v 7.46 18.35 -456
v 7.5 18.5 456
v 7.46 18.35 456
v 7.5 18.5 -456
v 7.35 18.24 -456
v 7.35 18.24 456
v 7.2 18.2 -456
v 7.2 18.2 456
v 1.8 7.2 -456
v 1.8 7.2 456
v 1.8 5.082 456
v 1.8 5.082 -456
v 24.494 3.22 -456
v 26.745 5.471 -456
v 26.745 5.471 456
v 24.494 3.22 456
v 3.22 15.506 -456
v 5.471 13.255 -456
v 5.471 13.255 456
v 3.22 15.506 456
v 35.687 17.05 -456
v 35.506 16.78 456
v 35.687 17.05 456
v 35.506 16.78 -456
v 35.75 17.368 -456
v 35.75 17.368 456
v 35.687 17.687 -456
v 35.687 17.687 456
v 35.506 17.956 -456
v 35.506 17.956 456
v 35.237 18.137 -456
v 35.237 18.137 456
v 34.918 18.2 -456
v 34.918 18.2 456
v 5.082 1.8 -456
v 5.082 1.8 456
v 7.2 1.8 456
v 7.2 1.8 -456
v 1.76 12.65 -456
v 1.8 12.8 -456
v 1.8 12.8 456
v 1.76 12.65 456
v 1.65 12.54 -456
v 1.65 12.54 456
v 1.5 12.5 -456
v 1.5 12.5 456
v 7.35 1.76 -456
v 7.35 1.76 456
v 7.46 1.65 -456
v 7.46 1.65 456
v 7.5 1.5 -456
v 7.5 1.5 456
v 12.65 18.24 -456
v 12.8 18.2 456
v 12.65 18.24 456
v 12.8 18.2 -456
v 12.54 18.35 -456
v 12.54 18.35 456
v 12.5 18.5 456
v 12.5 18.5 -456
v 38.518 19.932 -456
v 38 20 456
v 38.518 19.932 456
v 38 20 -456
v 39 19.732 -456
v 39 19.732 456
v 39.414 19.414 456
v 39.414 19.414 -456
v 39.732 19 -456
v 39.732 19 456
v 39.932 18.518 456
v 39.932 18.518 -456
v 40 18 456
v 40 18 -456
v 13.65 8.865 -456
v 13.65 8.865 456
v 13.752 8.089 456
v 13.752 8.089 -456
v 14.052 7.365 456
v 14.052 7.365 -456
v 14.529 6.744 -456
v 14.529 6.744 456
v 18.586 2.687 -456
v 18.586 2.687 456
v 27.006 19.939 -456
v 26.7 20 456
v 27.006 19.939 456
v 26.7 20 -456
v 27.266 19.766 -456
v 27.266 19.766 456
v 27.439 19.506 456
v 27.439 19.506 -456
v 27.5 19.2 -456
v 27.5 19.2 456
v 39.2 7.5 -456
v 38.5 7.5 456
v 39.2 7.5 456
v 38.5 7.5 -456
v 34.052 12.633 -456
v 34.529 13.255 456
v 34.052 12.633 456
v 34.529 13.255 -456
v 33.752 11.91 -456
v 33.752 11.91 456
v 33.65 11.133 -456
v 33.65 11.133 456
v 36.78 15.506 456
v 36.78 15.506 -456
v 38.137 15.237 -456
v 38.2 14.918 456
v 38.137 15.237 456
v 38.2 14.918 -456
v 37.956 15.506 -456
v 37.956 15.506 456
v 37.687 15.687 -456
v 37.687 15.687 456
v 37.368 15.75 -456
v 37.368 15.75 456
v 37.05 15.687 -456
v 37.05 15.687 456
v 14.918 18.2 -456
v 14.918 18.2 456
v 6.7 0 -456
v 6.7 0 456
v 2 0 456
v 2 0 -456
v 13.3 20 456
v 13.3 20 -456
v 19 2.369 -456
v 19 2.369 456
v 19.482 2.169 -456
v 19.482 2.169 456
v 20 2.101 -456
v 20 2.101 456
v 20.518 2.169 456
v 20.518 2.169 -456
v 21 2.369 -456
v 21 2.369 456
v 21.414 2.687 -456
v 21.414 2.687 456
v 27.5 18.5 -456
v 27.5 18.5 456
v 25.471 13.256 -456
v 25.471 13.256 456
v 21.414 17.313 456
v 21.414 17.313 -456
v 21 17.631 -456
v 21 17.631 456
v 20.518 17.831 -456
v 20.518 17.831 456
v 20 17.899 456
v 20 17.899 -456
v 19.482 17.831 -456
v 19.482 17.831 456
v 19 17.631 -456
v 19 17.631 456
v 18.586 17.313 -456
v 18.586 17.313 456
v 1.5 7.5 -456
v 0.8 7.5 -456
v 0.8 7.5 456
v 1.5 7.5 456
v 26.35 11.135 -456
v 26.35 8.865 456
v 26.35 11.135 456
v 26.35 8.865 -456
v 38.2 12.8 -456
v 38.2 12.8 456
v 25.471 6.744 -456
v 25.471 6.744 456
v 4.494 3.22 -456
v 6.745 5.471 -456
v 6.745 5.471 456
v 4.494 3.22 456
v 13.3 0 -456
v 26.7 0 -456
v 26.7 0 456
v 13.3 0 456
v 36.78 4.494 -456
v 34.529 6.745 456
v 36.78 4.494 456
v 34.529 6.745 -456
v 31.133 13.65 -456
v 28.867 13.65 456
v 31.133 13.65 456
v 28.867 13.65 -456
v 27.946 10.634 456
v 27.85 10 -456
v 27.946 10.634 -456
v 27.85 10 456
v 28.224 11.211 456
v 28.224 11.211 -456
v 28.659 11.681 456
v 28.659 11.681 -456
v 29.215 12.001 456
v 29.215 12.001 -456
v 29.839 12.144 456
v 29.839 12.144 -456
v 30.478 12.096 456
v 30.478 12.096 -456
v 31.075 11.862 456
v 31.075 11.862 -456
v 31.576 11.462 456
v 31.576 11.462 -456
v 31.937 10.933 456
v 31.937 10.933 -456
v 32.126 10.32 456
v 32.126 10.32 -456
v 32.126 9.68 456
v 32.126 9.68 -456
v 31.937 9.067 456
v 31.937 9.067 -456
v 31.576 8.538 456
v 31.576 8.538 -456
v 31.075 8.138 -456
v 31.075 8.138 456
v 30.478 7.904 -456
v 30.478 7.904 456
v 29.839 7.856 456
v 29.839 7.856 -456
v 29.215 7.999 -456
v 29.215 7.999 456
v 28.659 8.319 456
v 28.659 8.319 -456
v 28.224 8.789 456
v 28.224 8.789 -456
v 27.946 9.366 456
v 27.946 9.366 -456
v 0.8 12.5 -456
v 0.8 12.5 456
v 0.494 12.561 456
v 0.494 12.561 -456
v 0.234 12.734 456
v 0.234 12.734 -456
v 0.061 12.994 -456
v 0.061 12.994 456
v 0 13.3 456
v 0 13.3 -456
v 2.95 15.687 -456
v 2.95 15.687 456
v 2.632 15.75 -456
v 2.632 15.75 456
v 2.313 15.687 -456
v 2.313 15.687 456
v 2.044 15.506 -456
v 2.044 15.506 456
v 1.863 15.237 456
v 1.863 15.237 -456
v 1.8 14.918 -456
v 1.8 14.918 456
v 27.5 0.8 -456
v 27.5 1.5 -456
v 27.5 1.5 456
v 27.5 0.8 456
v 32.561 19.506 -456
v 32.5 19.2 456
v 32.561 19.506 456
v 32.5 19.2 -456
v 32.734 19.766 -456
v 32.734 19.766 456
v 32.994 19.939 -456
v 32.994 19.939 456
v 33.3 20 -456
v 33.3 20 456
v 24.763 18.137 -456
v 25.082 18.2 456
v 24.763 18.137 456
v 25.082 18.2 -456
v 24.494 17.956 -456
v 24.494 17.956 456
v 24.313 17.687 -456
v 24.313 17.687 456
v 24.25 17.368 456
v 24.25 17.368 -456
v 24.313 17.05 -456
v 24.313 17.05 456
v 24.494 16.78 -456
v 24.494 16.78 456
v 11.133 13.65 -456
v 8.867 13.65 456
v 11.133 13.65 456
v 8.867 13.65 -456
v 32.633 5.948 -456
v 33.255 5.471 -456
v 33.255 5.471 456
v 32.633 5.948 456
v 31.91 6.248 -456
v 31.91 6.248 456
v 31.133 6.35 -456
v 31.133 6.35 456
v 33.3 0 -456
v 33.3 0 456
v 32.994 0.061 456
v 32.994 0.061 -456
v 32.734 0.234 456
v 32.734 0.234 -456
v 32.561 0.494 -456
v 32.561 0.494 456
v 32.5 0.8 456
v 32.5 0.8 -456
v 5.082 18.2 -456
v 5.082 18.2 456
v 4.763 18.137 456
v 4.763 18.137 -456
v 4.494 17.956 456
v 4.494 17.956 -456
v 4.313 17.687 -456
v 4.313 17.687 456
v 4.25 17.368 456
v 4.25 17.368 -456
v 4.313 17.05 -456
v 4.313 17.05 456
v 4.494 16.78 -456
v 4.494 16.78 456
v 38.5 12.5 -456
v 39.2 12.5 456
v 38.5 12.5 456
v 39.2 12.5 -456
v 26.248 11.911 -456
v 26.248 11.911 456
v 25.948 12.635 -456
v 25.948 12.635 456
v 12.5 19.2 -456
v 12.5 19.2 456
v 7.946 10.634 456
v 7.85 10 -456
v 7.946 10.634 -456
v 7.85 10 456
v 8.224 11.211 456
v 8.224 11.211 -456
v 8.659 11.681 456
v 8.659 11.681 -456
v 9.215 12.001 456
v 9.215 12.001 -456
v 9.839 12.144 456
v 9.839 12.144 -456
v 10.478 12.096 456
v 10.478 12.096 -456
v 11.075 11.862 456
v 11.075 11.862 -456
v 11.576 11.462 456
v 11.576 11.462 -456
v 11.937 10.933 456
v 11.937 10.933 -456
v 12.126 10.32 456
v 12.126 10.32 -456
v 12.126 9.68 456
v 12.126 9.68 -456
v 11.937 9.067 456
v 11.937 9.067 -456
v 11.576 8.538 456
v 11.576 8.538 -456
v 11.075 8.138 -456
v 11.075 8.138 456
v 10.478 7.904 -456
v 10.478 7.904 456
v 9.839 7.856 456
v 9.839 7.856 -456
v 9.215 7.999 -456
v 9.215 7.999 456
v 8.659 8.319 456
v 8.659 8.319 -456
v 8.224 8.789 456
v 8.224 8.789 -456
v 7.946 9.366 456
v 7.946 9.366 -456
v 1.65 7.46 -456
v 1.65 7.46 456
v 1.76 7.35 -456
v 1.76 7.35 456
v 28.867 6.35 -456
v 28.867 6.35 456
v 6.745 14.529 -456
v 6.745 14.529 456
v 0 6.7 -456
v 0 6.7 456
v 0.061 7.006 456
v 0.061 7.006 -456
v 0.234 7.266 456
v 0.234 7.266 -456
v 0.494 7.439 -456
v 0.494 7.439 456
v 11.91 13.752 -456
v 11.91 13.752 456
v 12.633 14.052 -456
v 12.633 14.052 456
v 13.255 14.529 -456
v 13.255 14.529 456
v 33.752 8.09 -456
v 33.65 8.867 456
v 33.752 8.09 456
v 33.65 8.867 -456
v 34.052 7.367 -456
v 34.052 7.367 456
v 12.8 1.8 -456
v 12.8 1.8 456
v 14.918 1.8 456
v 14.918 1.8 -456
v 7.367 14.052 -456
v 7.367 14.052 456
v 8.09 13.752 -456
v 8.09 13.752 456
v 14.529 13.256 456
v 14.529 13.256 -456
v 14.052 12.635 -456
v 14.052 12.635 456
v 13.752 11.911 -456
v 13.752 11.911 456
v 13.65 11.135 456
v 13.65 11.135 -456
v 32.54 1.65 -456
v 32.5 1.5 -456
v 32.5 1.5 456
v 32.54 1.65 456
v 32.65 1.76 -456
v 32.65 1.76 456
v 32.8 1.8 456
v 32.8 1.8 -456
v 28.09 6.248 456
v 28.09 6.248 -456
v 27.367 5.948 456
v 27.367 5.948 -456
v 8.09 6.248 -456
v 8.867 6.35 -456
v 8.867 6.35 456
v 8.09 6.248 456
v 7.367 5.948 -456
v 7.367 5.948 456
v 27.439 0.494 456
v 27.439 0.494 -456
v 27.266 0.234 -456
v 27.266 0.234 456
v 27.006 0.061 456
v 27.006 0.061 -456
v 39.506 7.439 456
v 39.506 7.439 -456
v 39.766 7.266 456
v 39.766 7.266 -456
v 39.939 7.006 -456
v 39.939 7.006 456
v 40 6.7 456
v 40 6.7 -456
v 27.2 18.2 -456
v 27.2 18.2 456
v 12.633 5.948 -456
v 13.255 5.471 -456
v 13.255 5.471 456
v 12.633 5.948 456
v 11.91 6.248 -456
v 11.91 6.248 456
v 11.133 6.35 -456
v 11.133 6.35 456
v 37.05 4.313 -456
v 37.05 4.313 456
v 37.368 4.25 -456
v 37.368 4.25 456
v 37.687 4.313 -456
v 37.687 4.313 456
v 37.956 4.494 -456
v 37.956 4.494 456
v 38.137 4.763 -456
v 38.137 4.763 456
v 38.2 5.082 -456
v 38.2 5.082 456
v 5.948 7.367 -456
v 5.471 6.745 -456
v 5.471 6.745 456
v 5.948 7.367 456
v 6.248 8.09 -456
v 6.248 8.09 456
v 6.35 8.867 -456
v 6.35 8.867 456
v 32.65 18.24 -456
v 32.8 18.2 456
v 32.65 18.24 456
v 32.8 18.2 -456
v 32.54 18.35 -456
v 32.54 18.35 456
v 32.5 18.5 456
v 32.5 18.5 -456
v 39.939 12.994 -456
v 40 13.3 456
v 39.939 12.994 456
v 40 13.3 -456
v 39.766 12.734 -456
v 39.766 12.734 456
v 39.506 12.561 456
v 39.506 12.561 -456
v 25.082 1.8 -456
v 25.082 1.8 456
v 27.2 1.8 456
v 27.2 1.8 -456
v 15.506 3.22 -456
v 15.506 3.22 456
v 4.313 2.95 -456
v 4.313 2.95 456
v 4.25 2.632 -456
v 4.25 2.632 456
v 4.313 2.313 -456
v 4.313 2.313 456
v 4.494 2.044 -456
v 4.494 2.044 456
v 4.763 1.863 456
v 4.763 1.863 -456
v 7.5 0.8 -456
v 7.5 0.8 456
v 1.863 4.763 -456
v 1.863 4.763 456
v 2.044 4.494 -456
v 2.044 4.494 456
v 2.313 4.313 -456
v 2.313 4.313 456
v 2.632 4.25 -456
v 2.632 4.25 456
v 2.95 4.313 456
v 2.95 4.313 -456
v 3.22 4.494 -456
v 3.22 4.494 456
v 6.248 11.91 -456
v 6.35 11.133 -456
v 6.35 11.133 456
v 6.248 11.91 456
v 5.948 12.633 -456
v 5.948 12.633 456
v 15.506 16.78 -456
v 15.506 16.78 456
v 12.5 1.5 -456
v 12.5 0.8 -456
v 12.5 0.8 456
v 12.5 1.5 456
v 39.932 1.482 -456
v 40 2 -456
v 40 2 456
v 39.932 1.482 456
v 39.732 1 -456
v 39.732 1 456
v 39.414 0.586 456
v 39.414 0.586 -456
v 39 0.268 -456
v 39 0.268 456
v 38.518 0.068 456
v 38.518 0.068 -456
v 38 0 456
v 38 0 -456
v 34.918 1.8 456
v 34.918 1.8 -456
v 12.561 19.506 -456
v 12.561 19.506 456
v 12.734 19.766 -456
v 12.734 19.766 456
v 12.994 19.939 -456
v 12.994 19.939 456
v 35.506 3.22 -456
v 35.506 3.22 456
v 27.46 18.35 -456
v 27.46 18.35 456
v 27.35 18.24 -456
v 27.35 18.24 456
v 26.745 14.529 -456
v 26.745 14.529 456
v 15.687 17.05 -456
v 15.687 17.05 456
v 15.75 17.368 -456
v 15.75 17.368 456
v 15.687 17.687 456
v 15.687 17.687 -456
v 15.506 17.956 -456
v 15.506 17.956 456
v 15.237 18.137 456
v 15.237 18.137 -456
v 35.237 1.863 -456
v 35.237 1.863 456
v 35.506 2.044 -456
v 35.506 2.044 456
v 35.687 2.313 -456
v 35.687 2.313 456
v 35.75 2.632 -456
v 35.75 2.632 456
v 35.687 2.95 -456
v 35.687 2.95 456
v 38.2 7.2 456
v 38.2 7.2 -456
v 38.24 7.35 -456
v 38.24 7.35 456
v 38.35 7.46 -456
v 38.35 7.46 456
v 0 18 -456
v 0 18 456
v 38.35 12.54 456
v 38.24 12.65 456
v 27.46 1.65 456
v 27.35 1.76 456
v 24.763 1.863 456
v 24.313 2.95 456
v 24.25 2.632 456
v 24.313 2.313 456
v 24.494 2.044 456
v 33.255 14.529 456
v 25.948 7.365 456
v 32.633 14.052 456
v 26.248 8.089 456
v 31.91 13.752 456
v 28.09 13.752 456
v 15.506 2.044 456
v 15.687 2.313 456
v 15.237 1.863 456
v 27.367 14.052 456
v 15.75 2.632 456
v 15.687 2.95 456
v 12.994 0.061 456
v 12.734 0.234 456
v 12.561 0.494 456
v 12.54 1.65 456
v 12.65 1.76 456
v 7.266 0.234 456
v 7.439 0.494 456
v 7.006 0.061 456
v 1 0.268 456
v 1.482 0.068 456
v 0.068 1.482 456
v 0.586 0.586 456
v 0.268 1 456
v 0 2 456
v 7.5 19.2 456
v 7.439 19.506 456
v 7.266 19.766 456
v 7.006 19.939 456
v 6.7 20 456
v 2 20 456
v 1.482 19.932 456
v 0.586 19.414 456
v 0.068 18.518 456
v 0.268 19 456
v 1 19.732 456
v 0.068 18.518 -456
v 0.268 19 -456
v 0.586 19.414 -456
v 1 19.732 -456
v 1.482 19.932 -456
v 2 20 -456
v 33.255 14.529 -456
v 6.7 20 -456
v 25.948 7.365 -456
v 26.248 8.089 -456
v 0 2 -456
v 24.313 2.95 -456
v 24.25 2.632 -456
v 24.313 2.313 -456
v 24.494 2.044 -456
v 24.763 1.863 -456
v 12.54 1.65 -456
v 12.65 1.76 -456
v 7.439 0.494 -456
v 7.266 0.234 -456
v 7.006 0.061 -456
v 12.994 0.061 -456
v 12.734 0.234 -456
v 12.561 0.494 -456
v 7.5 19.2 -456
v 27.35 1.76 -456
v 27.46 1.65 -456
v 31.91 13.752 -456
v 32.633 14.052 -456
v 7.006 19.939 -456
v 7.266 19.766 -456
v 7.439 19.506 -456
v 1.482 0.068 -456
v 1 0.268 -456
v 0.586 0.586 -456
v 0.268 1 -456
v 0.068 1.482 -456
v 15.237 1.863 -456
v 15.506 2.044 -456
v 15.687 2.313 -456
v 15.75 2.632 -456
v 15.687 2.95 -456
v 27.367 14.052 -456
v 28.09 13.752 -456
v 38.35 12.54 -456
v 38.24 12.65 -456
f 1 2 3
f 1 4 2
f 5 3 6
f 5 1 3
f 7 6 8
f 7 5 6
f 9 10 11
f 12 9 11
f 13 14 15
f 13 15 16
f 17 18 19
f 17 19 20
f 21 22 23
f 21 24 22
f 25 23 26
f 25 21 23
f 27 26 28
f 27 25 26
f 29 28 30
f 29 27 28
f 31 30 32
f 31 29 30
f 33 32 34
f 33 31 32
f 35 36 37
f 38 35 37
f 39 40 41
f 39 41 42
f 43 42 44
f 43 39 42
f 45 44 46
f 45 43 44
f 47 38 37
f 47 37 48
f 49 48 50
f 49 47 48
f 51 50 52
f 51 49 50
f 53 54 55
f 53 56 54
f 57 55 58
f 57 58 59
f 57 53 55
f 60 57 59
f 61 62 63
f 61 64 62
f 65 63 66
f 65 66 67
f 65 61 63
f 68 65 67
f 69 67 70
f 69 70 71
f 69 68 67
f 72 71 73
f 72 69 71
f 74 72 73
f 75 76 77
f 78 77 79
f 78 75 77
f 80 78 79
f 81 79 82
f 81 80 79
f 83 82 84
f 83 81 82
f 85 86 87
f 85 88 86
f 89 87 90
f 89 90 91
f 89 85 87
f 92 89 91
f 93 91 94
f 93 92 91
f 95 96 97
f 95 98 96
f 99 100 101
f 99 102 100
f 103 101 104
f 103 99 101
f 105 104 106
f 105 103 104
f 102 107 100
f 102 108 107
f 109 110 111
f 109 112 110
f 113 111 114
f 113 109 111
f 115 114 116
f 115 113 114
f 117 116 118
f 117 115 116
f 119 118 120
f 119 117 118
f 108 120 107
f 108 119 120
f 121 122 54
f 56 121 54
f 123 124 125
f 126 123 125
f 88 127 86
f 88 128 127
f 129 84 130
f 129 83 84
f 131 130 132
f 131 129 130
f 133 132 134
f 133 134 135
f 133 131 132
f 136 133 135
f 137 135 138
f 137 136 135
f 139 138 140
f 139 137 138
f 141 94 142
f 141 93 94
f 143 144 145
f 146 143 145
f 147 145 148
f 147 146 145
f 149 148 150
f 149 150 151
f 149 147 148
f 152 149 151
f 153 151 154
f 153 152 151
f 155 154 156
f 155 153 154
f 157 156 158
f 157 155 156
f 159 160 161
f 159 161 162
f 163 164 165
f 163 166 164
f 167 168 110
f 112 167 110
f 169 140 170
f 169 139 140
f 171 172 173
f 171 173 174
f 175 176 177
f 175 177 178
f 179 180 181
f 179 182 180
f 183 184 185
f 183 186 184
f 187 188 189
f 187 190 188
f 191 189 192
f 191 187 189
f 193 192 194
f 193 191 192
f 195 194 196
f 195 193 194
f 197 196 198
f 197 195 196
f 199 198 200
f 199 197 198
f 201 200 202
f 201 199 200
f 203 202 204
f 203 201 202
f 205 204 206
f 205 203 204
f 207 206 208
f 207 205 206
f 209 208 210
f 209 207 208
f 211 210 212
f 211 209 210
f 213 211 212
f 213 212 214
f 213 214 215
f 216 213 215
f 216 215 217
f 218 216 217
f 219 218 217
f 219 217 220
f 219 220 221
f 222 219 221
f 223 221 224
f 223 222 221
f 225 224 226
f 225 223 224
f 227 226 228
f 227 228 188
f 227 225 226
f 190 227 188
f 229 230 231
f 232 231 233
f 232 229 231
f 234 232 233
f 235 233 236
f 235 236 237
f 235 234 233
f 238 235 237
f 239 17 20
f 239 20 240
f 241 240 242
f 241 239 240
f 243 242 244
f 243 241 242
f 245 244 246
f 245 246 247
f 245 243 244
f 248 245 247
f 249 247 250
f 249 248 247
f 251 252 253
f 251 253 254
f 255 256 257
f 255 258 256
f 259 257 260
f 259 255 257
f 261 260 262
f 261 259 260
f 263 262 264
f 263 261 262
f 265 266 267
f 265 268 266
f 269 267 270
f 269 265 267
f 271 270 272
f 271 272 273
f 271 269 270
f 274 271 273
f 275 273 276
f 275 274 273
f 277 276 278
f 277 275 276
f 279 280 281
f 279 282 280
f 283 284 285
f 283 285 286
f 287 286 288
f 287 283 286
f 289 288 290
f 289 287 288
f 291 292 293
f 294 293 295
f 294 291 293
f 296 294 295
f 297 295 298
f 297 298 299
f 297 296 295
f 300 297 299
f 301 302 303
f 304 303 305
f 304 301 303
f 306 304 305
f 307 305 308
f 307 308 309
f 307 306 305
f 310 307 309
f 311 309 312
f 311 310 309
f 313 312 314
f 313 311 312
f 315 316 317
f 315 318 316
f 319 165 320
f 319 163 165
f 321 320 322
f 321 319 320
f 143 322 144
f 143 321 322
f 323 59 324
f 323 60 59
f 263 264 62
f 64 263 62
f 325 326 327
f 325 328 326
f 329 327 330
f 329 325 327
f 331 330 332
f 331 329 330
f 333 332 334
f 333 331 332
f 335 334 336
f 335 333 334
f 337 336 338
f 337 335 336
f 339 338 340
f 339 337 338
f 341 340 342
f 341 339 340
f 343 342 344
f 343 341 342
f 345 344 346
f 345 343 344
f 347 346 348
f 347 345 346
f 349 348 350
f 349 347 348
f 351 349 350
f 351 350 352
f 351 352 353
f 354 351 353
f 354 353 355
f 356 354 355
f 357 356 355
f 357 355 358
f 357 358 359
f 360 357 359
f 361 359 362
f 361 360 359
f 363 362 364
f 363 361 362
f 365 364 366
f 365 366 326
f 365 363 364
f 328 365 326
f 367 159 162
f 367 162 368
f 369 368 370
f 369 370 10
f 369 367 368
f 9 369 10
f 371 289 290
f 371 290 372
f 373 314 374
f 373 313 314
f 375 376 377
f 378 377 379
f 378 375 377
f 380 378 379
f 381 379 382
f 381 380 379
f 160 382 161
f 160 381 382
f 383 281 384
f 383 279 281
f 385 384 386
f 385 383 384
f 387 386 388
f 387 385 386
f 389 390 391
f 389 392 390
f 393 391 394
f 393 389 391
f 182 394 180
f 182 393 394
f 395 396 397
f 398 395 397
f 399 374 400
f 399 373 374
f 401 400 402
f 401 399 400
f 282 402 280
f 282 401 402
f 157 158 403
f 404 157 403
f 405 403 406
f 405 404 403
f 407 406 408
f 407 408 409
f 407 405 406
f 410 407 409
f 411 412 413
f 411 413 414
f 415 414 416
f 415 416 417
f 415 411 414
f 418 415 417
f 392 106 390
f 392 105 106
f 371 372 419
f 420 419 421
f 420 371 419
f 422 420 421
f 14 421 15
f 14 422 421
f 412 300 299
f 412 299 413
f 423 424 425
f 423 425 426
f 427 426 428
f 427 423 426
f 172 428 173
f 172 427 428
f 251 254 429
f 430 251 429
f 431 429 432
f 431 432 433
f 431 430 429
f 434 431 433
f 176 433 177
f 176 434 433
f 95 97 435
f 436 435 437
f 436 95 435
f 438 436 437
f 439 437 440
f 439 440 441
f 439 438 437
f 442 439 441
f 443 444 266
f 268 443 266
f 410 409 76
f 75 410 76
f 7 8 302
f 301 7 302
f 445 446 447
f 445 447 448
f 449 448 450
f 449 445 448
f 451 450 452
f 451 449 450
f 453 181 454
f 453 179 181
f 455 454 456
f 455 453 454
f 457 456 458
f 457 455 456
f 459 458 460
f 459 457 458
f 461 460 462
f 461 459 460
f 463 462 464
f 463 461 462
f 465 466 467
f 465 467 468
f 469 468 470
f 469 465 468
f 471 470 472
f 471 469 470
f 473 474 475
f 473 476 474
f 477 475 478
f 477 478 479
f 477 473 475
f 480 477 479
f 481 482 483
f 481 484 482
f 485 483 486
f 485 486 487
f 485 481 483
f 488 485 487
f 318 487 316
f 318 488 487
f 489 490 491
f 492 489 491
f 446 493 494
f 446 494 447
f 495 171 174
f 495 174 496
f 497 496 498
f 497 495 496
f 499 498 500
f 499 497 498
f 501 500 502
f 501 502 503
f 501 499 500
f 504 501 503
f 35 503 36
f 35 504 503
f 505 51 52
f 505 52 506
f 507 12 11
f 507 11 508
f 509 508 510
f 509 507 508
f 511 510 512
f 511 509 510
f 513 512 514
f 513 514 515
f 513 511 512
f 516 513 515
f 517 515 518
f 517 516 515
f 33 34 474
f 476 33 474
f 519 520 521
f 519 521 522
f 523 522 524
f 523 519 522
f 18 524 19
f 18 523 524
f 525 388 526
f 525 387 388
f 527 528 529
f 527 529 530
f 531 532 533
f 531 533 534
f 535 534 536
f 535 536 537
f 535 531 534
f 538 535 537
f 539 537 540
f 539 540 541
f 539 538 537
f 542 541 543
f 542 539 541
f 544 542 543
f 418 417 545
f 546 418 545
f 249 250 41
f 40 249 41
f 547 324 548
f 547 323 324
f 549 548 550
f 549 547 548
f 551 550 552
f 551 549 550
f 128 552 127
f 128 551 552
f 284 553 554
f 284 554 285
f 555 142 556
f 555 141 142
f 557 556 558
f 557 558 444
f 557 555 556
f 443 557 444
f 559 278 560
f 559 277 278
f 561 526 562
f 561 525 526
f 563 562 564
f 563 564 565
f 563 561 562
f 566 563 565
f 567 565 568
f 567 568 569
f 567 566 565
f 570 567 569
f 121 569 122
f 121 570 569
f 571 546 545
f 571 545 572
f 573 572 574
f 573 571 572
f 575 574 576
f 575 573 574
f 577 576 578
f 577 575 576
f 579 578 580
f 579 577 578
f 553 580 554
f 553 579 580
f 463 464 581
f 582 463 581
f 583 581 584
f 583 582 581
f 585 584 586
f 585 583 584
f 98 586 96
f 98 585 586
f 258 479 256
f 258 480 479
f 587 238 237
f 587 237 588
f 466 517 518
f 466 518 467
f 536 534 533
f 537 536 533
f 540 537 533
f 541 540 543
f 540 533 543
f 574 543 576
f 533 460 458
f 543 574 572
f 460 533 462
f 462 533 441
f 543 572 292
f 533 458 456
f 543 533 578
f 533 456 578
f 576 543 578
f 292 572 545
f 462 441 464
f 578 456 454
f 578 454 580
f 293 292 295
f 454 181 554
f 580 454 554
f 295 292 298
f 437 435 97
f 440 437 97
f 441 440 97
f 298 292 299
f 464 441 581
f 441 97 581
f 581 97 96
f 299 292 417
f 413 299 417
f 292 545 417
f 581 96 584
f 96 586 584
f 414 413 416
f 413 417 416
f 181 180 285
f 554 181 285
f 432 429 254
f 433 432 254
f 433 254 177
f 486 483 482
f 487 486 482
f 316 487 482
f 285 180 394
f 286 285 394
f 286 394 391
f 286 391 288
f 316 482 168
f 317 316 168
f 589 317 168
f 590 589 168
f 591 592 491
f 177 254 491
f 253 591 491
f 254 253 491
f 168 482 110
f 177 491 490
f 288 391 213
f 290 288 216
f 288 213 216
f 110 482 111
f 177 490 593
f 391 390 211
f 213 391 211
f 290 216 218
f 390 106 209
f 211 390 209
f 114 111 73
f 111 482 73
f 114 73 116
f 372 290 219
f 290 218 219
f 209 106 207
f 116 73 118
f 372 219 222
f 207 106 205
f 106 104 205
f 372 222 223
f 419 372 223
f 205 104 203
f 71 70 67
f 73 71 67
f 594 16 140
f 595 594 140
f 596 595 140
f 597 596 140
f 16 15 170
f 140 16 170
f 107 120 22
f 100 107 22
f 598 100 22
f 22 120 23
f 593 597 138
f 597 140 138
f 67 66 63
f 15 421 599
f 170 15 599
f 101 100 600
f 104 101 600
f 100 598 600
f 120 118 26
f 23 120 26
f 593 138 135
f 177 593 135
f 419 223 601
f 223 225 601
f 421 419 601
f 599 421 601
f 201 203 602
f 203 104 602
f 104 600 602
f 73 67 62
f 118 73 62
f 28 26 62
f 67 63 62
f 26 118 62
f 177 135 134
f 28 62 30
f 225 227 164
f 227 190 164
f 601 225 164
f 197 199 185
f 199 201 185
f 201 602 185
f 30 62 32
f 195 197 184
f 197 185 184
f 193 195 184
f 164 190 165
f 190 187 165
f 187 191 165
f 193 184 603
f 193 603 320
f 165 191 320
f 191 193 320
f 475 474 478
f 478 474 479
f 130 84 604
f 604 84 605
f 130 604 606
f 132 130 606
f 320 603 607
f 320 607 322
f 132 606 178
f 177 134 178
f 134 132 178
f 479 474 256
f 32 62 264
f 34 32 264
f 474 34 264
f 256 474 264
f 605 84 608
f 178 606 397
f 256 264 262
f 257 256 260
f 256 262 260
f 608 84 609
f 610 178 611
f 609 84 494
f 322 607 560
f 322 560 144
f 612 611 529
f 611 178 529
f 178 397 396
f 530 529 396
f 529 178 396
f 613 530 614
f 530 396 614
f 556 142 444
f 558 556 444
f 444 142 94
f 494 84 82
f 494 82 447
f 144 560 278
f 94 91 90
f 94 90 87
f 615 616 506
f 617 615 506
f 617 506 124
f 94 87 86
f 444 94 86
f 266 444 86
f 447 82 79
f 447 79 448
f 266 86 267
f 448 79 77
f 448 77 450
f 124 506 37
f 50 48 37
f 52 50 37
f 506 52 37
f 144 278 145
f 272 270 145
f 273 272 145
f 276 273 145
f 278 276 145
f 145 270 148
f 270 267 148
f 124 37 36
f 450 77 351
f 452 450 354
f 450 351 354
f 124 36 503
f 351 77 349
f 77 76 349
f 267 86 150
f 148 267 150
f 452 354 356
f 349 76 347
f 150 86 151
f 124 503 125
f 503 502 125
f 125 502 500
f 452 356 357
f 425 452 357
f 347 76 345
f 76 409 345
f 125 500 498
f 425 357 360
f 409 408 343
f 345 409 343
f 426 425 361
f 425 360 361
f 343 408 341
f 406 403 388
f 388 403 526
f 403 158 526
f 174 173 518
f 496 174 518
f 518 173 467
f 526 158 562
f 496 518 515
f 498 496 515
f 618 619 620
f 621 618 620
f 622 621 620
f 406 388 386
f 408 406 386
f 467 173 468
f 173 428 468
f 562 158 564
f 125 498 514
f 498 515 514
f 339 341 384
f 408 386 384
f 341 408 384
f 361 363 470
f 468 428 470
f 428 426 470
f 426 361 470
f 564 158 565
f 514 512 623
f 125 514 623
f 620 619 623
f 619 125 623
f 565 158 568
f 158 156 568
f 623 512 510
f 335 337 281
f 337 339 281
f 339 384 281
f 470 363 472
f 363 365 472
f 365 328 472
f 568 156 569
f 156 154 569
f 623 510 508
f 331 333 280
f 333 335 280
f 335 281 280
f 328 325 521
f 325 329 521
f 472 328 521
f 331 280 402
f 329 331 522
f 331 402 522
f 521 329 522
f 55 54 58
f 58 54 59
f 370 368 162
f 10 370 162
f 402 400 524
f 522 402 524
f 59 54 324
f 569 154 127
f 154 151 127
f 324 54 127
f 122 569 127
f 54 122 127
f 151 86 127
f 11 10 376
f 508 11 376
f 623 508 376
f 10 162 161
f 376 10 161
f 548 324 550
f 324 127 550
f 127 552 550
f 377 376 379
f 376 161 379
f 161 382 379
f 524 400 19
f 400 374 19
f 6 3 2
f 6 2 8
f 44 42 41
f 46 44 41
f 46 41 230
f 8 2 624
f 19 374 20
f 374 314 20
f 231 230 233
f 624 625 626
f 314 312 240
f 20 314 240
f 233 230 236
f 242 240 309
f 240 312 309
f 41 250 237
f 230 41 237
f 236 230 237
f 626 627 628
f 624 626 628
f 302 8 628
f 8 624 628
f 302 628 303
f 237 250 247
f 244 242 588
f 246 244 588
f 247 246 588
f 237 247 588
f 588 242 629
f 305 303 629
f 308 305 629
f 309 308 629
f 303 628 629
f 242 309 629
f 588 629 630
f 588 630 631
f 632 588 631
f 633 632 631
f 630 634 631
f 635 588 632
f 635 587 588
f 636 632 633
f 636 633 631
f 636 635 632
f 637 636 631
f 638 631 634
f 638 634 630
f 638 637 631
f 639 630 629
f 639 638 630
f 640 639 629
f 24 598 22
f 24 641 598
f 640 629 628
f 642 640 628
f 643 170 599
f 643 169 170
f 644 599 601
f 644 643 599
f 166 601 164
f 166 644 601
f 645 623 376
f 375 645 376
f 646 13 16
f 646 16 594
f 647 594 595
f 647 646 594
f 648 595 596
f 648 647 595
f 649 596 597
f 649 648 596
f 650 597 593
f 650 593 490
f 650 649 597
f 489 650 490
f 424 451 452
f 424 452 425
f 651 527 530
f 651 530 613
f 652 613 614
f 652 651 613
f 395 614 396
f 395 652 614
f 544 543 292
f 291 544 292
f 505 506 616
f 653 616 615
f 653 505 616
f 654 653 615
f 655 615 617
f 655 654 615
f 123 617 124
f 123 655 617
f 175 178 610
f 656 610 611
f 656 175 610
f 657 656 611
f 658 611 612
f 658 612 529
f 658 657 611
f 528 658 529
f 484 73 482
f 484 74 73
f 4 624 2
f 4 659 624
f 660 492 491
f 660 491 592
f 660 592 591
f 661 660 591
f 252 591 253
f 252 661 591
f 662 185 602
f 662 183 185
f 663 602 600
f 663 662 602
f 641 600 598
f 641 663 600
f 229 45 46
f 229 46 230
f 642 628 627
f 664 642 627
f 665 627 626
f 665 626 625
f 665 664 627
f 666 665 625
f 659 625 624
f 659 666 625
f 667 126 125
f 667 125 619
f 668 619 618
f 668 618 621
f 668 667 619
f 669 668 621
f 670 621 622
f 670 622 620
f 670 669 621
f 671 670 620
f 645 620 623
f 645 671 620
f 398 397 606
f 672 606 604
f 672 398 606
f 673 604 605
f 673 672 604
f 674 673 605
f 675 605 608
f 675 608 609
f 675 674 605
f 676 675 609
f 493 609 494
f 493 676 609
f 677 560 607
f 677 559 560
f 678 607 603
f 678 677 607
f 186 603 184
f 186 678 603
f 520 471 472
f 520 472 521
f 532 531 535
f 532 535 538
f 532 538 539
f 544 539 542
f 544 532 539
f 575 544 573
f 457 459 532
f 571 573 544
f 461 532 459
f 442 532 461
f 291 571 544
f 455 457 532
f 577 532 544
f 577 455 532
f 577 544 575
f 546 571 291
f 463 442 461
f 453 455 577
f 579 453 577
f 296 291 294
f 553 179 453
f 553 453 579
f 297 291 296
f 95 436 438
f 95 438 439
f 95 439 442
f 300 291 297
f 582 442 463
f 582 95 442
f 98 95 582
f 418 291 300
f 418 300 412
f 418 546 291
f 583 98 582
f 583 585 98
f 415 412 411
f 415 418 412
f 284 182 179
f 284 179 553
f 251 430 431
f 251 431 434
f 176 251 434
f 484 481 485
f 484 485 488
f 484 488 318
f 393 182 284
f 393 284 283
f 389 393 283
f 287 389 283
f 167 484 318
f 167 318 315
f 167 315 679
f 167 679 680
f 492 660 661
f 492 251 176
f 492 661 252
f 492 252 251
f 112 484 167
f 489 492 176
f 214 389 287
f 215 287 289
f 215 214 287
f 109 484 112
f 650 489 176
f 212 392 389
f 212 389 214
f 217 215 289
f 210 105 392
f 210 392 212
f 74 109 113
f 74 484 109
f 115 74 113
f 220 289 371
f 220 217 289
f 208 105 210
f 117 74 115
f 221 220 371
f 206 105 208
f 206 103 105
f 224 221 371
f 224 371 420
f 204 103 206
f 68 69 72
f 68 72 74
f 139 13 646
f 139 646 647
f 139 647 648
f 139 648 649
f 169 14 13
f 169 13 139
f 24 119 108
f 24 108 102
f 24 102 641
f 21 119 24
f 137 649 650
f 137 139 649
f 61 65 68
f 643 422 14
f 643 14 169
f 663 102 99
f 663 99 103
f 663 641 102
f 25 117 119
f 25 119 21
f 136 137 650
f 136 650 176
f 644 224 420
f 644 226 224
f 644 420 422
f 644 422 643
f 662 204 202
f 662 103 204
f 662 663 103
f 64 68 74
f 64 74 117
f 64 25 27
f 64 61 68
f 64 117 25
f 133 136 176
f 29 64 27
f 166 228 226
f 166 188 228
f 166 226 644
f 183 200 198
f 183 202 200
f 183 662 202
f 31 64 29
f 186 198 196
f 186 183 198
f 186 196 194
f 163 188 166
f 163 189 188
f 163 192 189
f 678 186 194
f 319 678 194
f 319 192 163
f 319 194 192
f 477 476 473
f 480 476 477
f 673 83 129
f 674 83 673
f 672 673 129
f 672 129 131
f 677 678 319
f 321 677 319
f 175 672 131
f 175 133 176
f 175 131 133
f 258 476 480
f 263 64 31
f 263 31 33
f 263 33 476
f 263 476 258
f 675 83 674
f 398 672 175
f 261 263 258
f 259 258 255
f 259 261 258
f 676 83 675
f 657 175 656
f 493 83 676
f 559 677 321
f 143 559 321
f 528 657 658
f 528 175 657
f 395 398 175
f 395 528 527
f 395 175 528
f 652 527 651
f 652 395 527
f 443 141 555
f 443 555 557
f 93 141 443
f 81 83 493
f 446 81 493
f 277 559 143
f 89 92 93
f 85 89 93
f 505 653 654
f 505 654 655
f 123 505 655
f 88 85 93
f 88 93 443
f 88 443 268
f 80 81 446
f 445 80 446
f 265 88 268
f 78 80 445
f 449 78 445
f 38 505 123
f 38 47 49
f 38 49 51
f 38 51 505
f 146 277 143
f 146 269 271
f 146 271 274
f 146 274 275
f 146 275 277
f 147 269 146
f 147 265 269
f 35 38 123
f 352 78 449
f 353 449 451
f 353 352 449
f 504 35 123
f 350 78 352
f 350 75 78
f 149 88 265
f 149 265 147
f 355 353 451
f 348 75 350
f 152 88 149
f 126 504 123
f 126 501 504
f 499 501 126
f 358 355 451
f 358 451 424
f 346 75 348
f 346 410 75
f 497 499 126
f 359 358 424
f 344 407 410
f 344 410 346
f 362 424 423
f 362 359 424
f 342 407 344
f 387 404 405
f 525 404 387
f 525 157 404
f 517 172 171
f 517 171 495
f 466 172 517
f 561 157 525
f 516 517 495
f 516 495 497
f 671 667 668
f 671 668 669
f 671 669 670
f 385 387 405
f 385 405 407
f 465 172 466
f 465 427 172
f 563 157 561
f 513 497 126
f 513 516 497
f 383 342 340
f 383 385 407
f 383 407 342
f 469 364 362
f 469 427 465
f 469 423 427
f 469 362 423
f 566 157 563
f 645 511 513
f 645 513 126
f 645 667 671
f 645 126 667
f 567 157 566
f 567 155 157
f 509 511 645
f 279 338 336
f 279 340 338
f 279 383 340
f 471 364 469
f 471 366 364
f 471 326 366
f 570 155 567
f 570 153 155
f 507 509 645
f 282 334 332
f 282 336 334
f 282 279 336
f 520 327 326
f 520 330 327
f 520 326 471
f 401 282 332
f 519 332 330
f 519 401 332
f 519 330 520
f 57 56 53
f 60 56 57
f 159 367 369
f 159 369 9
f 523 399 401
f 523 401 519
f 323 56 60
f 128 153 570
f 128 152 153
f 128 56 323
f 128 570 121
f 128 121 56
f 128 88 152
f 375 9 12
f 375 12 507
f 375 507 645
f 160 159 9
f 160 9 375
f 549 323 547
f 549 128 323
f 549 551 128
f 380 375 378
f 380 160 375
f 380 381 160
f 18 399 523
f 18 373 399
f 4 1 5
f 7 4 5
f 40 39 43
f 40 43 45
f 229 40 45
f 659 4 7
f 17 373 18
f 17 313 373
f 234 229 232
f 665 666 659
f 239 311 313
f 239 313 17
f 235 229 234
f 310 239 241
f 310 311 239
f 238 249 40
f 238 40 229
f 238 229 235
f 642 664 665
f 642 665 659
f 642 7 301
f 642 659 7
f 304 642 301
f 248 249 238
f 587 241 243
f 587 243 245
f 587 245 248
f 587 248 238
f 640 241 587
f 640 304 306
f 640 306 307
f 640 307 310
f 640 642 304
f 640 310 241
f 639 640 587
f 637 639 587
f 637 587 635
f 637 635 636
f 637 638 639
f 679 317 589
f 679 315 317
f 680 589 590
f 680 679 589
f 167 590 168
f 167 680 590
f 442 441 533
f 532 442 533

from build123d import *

# Parameters (mm, degrees)
ESQUISSE1_R        = 2.15
BOSS_EXTRU_1_DEPTH = 456


with BuildPart() as part:
    # Esquisse1 → Boss.-Extru.1 (new, symmetric)
    with BuildSketch(Plane(origin=(0, 0, 0), x_dir=(-1, 0, 0), z_dir=(0, 0, -1))):
        with BuildLine():
            Line((-40, 6.7), (-40, 2))
            ThreePointArc((-40, 2), (-39.414213562, 0.585786438), (-38, 0))
            Line((-38, 0), (-33.3, 0))
            ThreePointArc((-33.3, 0), (-32.734314575, 0.234314575), (-32.5, 0.8))
            Line((-32.5, 0.8), (-32.5, 1.5))
            ThreePointArc((-32.5, 1.5), (-32.587867966, 1.712132034), (-32.8, 1.8))
            Line((-32.8, 1.8), (-34.918424061, 1.8))
            ThreePointArc((-34.918424061, 1.8), (-35.686700051, 2.313345604), (-35.506437047, 3.219588924))
            Line((-35.506437047, 3.219588924), (-33.254705627, 5.471320344))
            ThreePointArc((-33.254705627, 5.471320344), (-32.281435581, 6.121638598), (-31.133385284, 6.35))
            Line((-31.133385284, 6.35), (-28.866614716, 6.35))
            ThreePointArc((-28.866614716, 6.35), (-27.718564419, 6.121638598), (-26.745294373, 5.471320344))
            Line((-26.745294373, 5.471320344), (-24.493562953, 3.219588924))
            ThreePointArc((-24.493562953, 3.219588924), (-24.313299949, 2.313345604), (-25.081575939, 1.8))
            Line((-25.081575939, 1.8), (-27.2, 1.8))
            ThreePointArc((-27.2, 1.8), (-27.412132034, 1.712132034), (-27.5, 1.5))
            Line((-27.5, 1.5), (-27.5, 0.8))
            ThreePointArc((-27.5, 0.8), (-27.265685425, 0.234314575), (-26.7, 0))
            Line((-26.7, 0), (-13.3, 0))
            ThreePointArc((-13.3, 0), (-12.734314575, 0.234314575), (-12.5, 0.8))
            Line((-12.5, 0.8), (-12.5, 1.5))
            ThreePointArc((-12.5, 1.5), (-12.587867966, 1.712132034), (-12.8, 1.8))
            Line((-12.8, 1.8), (-14.918424061, 1.8))
            ThreePointArc((-14.918424061, 1.8), (-15.686700051, 2.313345604), (-15.506437047, 3.219588924))
            Line((-15.506437047, 3.219588924), (-13.254705627, 5.471320344))
            ThreePointArc((-13.254705627, 5.471320344), (-12.281435581, 6.121638598), (-11.133385284, 6.35))
            Line((-11.133385284, 6.35), (-8.866614716, 6.35))
            ThreePointArc((-8.866614716, 6.35), (-7.718564419, 6.121638598), (-6.745294373, 5.471320344))
            Line((-6.745294373, 5.471320344), (-4.493562953, 3.219588924))
            ThreePointArc((-4.493562953, 3.219588924), (-4.313299949, 2.313345604), (-5.081575939, 1.8))
            Line((-5.081575939, 1.8), (-7.2, 1.8))
            ThreePointArc((-7.2, 1.8), (-7.412132034, 1.712132034), (-7.5, 1.5))
            Line((-7.5, 1.5), (-7.5, 0.8))
            ThreePointArc((-7.5, 0.8), (-7.265685425, 0.234314575), (-6.7, 0))
            Line((-6.7, 0), (-2, 0))
            ThreePointArc((-2, 0), (-0.585786438, 0.585786438), (0, 2))
            Line((0, 2), (0, 6.7))
            ThreePointArc((0, 6.7), (-0.234314575, 7.265685425), (-0.8, 7.5))
            Line((-0.8, 7.5), (-1.5, 7.5))
            ThreePointArc((-1.5, 7.5), (-1.712132034, 7.412132034), (-1.8, 7.2))
            Line((-1.8, 7.2), (-1.8, 5.081575939))
            ThreePointArc((-1.8, 5.081575939), (-2.313345604, 4.313299949), (-3.219588924, 4.493562953))
            Line((-3.219588924, 4.493562953), (-5.471320344, 6.745294373))
            ThreePointArc((-5.471320344, 6.745294373), (-6.121638598, 7.718564419), (-6.35, 8.866614716))
            Line((-6.35, 8.866614716), (-6.35, 11.133385284))
            ThreePointArc((-6.35, 11.133385284), (-6.121638598, 12.281435581), (-5.471320344, 13.254705627))
            Line((-5.471320344, 13.254705627), (-3.219588924, 15.506437047))
            ThreePointArc((-3.219588924, 15.506437047), (-2.313345604, 15.686700051), (-1.8, 14.918424061))
            Line((-1.8, 14.918424061), (-1.8, 12.8))
            ThreePointArc((-1.8, 12.8), (-1.712132034, 12.587867966), (-1.5, 12.5))
            Line((-1.5, 12.5), (-0.8, 12.5))
            ThreePointArc((-0.8, 12.5), (-0.234314575, 12.734314575), (0, 13.3))
            Line((0, 13.3), (0, 18))
            ThreePointArc((0, 18), (-0.585786438, 19.414213562), (-2, 20))
            Line((-2, 20), (-6.7, 20))
            ThreePointArc((-6.7, 20), (-7.265685425, 19.765685425), (-7.5, 19.2))
            Line((-7.5, 19.2), (-7.5, 18.5))
            ThreePointArc((-7.5, 18.5), (-7.412132034, 18.287867966), (-7.2, 18.2))
            Line((-7.2, 18.2), (-5.081575939, 18.2))
            ThreePointArc((-5.081575939, 18.2), (-4.313299949, 17.686654396), (-4.493562953, 16.780411076))
            Line((-4.493562953, 16.780411076), (-6.745294373, 14.528679656))
            ThreePointArc((-6.745294373, 14.528679656), (-7.718564419, 13.878361402), (-8.866614716, 13.65))
            Line((-8.866614716, 13.65), (-11.133385284, 13.65))
            ThreePointArc((-11.133385284, 13.65), (-12.281435581, 13.878361402), (-13.254705627, 14.528679656))
            Line((-13.254705627, 14.528679656), (-15.506437047, 16.780411076))
            ThreePointArc((-15.506437047, 16.780411076), (-15.686700051, 17.686654396), (-14.918424061, 18.2))
            Line((-14.918424061, 18.2), (-12.8, 18.2))
            ThreePointArc((-12.8, 18.2), (-12.587867966, 18.287867966), (-12.5, 18.5))
            Line((-12.5, 18.5), (-12.5, 19.2))
            ThreePointArc((-12.5, 19.2), (-12.734314575, 19.765685425), (-13.3, 20))
            Line((-13.3, 20), (-26.7, 20))
            ThreePointArc((-26.7, 20), (-27.265685425, 19.765685425), (-27.5, 19.2))
            Line((-27.5, 19.2), (-27.5, 18.5))
            ThreePointArc((-27.5, 18.5), (-27.412132034, 18.287867966), (-27.2, 18.2))
            Line((-27.2, 18.2), (-25.081575939, 18.2))
            ThreePointArc((-25.081575939, 18.2), (-24.313299949, 17.686654396), (-24.493562953, 16.780411076))
            Line((-24.493562953, 16.780411076), (-26.745294373, 14.528679656))
            ThreePointArc((-26.745294373, 14.528679656), (-27.718564419, 13.878361402), (-28.866614716, 13.65))
            Line((-28.866614716, 13.65), (-31.133385284, 13.65))
            ThreePointArc((-31.133385284, 13.65), (-32.281435581, 13.878361402), (-33.254705627, 14.528679656))
            Line((-33.254705627, 14.528679656), (-35.506437047, 16.780411076))
            ThreePointArc((-35.506437047, 16.780411076), (-35.686700051, 17.686654396), (-34.918424061, 18.2))
            Line((-34.918424061, 18.2), (-32.8, 18.2))
            ThreePointArc((-32.8, 18.2), (-32.587867966, 18.287867966), (-32.5, 18.5))
            Line((-32.5, 18.5), (-32.5, 19.2))
            ThreePointArc((-32.5, 19.2), (-32.734314575, 19.765685425), (-33.3, 20))
            Line((-33.3, 20), (-38, 20))
            ThreePointArc((-38, 20), (-39.414213562, 19.414213562), (-40, 18))
            Line((-40, 18), (-40, 13.3))
            ThreePointArc((-40, 13.3), (-39.765685425, 12.734314575), (-39.2, 12.5))
            Line((-39.2, 12.5), (-38.5, 12.5))
            ThreePointArc((-38.5, 12.5), (-38.287867966, 12.587867966), (-38.2, 12.8))
            Line((-38.2, 12.8), (-38.2, 14.918424061))
            ThreePointArc((-38.2, 14.918424061), (-37.686654396, 15.686700051), (-36.780411076, 15.506437047))
            Line((-36.780411076, 15.506437047), (-34.528679656, 13.254705627))
            ThreePointArc((-34.528679656, 13.254705627), (-33.878361402, 12.281435581), (-33.65, 11.133385284))
            Line((-33.65, 11.133385284), (-33.65, 8.866614716))
            ThreePointArc((-33.65, 8.866614716), (-33.878361402, 7.718564419), (-34.528679656, 6.745294373))
            Line((-34.528679656, 6.745294373), (-36.780411076, 4.493562953))
            ThreePointArc((-36.780411076, 4.493562953), (-37.686654396, 4.313299949), (-38.2, 5.081575939))
            Line((-38.2, 5.081575939), (-38.2, 7.2))
            ThreePointArc((-38.2, 7.2), (-38.287867966, 7.412132034), (-38.5, 7.5))
            Line((-38.5, 7.5), (-39.2, 7.5))
            ThreePointArc((-39.2, 7.5), (-39.765685425, 7.265685425), (-40, 6.7))
        make_face()
        with Locations((-10, 10)):
            Circle(ESQUISSE1_R, mode=Mode.SUBTRACT)
        with Locations((-30, 10)):
            Circle(ESQUISSE1_R, mode=Mode.SUBTRACT)
        with BuildLine():
            Line((-18.585786174, 17.312993861), (-14.528681072, 13.255889759))
            ThreePointArc((-14.528681072, 13.255889759), (-13.878362627, 12.282619622), (-13.650001154, 11.134569154))
            Line((-13.650001154, 11.134569154), (-13.650001154, 8.865431094))
            ThreePointArc((-13.650001154, 8.865431094), (-13.878362476, 7.717381202), (-14.5286805, 6.7441115))
            Line((-14.5286805, 6.7441115), (-18.585786, 2.687006))
            ThreePointArc((-18.585786, 2.687006), (-19.999999562, 2.101219562), (-21.414213125, 2.687006))
            Line((-21.414213125, 2.687006), (-25.471320125, 6.744113))
            ThreePointArc((-25.471320125, 6.744113), (-26.121638379, 7.717383046), (-26.349999781, 8.865433344))
            Line((-26.349999781, 8.865433344), (-26.349999781, 11.134567344))
            ThreePointArc((-26.349999781, 11.134567344), (-26.121638308, 12.282617811), (-25.471319863, 13.255887949))
            Line((-25.471319863, 13.255887949), (-21.41421295, 17.312993861))
            ThreePointArc((-21.41421295, 17.312993861), (-19.999999562, 17.898780125), (-18.585786174, 17.312993861))
        make_face(mode=Mode.SUBTRACT)
    extrude(amount=BOSS_EXTRU_1_DEPTH, both=True)


solid = part.part
